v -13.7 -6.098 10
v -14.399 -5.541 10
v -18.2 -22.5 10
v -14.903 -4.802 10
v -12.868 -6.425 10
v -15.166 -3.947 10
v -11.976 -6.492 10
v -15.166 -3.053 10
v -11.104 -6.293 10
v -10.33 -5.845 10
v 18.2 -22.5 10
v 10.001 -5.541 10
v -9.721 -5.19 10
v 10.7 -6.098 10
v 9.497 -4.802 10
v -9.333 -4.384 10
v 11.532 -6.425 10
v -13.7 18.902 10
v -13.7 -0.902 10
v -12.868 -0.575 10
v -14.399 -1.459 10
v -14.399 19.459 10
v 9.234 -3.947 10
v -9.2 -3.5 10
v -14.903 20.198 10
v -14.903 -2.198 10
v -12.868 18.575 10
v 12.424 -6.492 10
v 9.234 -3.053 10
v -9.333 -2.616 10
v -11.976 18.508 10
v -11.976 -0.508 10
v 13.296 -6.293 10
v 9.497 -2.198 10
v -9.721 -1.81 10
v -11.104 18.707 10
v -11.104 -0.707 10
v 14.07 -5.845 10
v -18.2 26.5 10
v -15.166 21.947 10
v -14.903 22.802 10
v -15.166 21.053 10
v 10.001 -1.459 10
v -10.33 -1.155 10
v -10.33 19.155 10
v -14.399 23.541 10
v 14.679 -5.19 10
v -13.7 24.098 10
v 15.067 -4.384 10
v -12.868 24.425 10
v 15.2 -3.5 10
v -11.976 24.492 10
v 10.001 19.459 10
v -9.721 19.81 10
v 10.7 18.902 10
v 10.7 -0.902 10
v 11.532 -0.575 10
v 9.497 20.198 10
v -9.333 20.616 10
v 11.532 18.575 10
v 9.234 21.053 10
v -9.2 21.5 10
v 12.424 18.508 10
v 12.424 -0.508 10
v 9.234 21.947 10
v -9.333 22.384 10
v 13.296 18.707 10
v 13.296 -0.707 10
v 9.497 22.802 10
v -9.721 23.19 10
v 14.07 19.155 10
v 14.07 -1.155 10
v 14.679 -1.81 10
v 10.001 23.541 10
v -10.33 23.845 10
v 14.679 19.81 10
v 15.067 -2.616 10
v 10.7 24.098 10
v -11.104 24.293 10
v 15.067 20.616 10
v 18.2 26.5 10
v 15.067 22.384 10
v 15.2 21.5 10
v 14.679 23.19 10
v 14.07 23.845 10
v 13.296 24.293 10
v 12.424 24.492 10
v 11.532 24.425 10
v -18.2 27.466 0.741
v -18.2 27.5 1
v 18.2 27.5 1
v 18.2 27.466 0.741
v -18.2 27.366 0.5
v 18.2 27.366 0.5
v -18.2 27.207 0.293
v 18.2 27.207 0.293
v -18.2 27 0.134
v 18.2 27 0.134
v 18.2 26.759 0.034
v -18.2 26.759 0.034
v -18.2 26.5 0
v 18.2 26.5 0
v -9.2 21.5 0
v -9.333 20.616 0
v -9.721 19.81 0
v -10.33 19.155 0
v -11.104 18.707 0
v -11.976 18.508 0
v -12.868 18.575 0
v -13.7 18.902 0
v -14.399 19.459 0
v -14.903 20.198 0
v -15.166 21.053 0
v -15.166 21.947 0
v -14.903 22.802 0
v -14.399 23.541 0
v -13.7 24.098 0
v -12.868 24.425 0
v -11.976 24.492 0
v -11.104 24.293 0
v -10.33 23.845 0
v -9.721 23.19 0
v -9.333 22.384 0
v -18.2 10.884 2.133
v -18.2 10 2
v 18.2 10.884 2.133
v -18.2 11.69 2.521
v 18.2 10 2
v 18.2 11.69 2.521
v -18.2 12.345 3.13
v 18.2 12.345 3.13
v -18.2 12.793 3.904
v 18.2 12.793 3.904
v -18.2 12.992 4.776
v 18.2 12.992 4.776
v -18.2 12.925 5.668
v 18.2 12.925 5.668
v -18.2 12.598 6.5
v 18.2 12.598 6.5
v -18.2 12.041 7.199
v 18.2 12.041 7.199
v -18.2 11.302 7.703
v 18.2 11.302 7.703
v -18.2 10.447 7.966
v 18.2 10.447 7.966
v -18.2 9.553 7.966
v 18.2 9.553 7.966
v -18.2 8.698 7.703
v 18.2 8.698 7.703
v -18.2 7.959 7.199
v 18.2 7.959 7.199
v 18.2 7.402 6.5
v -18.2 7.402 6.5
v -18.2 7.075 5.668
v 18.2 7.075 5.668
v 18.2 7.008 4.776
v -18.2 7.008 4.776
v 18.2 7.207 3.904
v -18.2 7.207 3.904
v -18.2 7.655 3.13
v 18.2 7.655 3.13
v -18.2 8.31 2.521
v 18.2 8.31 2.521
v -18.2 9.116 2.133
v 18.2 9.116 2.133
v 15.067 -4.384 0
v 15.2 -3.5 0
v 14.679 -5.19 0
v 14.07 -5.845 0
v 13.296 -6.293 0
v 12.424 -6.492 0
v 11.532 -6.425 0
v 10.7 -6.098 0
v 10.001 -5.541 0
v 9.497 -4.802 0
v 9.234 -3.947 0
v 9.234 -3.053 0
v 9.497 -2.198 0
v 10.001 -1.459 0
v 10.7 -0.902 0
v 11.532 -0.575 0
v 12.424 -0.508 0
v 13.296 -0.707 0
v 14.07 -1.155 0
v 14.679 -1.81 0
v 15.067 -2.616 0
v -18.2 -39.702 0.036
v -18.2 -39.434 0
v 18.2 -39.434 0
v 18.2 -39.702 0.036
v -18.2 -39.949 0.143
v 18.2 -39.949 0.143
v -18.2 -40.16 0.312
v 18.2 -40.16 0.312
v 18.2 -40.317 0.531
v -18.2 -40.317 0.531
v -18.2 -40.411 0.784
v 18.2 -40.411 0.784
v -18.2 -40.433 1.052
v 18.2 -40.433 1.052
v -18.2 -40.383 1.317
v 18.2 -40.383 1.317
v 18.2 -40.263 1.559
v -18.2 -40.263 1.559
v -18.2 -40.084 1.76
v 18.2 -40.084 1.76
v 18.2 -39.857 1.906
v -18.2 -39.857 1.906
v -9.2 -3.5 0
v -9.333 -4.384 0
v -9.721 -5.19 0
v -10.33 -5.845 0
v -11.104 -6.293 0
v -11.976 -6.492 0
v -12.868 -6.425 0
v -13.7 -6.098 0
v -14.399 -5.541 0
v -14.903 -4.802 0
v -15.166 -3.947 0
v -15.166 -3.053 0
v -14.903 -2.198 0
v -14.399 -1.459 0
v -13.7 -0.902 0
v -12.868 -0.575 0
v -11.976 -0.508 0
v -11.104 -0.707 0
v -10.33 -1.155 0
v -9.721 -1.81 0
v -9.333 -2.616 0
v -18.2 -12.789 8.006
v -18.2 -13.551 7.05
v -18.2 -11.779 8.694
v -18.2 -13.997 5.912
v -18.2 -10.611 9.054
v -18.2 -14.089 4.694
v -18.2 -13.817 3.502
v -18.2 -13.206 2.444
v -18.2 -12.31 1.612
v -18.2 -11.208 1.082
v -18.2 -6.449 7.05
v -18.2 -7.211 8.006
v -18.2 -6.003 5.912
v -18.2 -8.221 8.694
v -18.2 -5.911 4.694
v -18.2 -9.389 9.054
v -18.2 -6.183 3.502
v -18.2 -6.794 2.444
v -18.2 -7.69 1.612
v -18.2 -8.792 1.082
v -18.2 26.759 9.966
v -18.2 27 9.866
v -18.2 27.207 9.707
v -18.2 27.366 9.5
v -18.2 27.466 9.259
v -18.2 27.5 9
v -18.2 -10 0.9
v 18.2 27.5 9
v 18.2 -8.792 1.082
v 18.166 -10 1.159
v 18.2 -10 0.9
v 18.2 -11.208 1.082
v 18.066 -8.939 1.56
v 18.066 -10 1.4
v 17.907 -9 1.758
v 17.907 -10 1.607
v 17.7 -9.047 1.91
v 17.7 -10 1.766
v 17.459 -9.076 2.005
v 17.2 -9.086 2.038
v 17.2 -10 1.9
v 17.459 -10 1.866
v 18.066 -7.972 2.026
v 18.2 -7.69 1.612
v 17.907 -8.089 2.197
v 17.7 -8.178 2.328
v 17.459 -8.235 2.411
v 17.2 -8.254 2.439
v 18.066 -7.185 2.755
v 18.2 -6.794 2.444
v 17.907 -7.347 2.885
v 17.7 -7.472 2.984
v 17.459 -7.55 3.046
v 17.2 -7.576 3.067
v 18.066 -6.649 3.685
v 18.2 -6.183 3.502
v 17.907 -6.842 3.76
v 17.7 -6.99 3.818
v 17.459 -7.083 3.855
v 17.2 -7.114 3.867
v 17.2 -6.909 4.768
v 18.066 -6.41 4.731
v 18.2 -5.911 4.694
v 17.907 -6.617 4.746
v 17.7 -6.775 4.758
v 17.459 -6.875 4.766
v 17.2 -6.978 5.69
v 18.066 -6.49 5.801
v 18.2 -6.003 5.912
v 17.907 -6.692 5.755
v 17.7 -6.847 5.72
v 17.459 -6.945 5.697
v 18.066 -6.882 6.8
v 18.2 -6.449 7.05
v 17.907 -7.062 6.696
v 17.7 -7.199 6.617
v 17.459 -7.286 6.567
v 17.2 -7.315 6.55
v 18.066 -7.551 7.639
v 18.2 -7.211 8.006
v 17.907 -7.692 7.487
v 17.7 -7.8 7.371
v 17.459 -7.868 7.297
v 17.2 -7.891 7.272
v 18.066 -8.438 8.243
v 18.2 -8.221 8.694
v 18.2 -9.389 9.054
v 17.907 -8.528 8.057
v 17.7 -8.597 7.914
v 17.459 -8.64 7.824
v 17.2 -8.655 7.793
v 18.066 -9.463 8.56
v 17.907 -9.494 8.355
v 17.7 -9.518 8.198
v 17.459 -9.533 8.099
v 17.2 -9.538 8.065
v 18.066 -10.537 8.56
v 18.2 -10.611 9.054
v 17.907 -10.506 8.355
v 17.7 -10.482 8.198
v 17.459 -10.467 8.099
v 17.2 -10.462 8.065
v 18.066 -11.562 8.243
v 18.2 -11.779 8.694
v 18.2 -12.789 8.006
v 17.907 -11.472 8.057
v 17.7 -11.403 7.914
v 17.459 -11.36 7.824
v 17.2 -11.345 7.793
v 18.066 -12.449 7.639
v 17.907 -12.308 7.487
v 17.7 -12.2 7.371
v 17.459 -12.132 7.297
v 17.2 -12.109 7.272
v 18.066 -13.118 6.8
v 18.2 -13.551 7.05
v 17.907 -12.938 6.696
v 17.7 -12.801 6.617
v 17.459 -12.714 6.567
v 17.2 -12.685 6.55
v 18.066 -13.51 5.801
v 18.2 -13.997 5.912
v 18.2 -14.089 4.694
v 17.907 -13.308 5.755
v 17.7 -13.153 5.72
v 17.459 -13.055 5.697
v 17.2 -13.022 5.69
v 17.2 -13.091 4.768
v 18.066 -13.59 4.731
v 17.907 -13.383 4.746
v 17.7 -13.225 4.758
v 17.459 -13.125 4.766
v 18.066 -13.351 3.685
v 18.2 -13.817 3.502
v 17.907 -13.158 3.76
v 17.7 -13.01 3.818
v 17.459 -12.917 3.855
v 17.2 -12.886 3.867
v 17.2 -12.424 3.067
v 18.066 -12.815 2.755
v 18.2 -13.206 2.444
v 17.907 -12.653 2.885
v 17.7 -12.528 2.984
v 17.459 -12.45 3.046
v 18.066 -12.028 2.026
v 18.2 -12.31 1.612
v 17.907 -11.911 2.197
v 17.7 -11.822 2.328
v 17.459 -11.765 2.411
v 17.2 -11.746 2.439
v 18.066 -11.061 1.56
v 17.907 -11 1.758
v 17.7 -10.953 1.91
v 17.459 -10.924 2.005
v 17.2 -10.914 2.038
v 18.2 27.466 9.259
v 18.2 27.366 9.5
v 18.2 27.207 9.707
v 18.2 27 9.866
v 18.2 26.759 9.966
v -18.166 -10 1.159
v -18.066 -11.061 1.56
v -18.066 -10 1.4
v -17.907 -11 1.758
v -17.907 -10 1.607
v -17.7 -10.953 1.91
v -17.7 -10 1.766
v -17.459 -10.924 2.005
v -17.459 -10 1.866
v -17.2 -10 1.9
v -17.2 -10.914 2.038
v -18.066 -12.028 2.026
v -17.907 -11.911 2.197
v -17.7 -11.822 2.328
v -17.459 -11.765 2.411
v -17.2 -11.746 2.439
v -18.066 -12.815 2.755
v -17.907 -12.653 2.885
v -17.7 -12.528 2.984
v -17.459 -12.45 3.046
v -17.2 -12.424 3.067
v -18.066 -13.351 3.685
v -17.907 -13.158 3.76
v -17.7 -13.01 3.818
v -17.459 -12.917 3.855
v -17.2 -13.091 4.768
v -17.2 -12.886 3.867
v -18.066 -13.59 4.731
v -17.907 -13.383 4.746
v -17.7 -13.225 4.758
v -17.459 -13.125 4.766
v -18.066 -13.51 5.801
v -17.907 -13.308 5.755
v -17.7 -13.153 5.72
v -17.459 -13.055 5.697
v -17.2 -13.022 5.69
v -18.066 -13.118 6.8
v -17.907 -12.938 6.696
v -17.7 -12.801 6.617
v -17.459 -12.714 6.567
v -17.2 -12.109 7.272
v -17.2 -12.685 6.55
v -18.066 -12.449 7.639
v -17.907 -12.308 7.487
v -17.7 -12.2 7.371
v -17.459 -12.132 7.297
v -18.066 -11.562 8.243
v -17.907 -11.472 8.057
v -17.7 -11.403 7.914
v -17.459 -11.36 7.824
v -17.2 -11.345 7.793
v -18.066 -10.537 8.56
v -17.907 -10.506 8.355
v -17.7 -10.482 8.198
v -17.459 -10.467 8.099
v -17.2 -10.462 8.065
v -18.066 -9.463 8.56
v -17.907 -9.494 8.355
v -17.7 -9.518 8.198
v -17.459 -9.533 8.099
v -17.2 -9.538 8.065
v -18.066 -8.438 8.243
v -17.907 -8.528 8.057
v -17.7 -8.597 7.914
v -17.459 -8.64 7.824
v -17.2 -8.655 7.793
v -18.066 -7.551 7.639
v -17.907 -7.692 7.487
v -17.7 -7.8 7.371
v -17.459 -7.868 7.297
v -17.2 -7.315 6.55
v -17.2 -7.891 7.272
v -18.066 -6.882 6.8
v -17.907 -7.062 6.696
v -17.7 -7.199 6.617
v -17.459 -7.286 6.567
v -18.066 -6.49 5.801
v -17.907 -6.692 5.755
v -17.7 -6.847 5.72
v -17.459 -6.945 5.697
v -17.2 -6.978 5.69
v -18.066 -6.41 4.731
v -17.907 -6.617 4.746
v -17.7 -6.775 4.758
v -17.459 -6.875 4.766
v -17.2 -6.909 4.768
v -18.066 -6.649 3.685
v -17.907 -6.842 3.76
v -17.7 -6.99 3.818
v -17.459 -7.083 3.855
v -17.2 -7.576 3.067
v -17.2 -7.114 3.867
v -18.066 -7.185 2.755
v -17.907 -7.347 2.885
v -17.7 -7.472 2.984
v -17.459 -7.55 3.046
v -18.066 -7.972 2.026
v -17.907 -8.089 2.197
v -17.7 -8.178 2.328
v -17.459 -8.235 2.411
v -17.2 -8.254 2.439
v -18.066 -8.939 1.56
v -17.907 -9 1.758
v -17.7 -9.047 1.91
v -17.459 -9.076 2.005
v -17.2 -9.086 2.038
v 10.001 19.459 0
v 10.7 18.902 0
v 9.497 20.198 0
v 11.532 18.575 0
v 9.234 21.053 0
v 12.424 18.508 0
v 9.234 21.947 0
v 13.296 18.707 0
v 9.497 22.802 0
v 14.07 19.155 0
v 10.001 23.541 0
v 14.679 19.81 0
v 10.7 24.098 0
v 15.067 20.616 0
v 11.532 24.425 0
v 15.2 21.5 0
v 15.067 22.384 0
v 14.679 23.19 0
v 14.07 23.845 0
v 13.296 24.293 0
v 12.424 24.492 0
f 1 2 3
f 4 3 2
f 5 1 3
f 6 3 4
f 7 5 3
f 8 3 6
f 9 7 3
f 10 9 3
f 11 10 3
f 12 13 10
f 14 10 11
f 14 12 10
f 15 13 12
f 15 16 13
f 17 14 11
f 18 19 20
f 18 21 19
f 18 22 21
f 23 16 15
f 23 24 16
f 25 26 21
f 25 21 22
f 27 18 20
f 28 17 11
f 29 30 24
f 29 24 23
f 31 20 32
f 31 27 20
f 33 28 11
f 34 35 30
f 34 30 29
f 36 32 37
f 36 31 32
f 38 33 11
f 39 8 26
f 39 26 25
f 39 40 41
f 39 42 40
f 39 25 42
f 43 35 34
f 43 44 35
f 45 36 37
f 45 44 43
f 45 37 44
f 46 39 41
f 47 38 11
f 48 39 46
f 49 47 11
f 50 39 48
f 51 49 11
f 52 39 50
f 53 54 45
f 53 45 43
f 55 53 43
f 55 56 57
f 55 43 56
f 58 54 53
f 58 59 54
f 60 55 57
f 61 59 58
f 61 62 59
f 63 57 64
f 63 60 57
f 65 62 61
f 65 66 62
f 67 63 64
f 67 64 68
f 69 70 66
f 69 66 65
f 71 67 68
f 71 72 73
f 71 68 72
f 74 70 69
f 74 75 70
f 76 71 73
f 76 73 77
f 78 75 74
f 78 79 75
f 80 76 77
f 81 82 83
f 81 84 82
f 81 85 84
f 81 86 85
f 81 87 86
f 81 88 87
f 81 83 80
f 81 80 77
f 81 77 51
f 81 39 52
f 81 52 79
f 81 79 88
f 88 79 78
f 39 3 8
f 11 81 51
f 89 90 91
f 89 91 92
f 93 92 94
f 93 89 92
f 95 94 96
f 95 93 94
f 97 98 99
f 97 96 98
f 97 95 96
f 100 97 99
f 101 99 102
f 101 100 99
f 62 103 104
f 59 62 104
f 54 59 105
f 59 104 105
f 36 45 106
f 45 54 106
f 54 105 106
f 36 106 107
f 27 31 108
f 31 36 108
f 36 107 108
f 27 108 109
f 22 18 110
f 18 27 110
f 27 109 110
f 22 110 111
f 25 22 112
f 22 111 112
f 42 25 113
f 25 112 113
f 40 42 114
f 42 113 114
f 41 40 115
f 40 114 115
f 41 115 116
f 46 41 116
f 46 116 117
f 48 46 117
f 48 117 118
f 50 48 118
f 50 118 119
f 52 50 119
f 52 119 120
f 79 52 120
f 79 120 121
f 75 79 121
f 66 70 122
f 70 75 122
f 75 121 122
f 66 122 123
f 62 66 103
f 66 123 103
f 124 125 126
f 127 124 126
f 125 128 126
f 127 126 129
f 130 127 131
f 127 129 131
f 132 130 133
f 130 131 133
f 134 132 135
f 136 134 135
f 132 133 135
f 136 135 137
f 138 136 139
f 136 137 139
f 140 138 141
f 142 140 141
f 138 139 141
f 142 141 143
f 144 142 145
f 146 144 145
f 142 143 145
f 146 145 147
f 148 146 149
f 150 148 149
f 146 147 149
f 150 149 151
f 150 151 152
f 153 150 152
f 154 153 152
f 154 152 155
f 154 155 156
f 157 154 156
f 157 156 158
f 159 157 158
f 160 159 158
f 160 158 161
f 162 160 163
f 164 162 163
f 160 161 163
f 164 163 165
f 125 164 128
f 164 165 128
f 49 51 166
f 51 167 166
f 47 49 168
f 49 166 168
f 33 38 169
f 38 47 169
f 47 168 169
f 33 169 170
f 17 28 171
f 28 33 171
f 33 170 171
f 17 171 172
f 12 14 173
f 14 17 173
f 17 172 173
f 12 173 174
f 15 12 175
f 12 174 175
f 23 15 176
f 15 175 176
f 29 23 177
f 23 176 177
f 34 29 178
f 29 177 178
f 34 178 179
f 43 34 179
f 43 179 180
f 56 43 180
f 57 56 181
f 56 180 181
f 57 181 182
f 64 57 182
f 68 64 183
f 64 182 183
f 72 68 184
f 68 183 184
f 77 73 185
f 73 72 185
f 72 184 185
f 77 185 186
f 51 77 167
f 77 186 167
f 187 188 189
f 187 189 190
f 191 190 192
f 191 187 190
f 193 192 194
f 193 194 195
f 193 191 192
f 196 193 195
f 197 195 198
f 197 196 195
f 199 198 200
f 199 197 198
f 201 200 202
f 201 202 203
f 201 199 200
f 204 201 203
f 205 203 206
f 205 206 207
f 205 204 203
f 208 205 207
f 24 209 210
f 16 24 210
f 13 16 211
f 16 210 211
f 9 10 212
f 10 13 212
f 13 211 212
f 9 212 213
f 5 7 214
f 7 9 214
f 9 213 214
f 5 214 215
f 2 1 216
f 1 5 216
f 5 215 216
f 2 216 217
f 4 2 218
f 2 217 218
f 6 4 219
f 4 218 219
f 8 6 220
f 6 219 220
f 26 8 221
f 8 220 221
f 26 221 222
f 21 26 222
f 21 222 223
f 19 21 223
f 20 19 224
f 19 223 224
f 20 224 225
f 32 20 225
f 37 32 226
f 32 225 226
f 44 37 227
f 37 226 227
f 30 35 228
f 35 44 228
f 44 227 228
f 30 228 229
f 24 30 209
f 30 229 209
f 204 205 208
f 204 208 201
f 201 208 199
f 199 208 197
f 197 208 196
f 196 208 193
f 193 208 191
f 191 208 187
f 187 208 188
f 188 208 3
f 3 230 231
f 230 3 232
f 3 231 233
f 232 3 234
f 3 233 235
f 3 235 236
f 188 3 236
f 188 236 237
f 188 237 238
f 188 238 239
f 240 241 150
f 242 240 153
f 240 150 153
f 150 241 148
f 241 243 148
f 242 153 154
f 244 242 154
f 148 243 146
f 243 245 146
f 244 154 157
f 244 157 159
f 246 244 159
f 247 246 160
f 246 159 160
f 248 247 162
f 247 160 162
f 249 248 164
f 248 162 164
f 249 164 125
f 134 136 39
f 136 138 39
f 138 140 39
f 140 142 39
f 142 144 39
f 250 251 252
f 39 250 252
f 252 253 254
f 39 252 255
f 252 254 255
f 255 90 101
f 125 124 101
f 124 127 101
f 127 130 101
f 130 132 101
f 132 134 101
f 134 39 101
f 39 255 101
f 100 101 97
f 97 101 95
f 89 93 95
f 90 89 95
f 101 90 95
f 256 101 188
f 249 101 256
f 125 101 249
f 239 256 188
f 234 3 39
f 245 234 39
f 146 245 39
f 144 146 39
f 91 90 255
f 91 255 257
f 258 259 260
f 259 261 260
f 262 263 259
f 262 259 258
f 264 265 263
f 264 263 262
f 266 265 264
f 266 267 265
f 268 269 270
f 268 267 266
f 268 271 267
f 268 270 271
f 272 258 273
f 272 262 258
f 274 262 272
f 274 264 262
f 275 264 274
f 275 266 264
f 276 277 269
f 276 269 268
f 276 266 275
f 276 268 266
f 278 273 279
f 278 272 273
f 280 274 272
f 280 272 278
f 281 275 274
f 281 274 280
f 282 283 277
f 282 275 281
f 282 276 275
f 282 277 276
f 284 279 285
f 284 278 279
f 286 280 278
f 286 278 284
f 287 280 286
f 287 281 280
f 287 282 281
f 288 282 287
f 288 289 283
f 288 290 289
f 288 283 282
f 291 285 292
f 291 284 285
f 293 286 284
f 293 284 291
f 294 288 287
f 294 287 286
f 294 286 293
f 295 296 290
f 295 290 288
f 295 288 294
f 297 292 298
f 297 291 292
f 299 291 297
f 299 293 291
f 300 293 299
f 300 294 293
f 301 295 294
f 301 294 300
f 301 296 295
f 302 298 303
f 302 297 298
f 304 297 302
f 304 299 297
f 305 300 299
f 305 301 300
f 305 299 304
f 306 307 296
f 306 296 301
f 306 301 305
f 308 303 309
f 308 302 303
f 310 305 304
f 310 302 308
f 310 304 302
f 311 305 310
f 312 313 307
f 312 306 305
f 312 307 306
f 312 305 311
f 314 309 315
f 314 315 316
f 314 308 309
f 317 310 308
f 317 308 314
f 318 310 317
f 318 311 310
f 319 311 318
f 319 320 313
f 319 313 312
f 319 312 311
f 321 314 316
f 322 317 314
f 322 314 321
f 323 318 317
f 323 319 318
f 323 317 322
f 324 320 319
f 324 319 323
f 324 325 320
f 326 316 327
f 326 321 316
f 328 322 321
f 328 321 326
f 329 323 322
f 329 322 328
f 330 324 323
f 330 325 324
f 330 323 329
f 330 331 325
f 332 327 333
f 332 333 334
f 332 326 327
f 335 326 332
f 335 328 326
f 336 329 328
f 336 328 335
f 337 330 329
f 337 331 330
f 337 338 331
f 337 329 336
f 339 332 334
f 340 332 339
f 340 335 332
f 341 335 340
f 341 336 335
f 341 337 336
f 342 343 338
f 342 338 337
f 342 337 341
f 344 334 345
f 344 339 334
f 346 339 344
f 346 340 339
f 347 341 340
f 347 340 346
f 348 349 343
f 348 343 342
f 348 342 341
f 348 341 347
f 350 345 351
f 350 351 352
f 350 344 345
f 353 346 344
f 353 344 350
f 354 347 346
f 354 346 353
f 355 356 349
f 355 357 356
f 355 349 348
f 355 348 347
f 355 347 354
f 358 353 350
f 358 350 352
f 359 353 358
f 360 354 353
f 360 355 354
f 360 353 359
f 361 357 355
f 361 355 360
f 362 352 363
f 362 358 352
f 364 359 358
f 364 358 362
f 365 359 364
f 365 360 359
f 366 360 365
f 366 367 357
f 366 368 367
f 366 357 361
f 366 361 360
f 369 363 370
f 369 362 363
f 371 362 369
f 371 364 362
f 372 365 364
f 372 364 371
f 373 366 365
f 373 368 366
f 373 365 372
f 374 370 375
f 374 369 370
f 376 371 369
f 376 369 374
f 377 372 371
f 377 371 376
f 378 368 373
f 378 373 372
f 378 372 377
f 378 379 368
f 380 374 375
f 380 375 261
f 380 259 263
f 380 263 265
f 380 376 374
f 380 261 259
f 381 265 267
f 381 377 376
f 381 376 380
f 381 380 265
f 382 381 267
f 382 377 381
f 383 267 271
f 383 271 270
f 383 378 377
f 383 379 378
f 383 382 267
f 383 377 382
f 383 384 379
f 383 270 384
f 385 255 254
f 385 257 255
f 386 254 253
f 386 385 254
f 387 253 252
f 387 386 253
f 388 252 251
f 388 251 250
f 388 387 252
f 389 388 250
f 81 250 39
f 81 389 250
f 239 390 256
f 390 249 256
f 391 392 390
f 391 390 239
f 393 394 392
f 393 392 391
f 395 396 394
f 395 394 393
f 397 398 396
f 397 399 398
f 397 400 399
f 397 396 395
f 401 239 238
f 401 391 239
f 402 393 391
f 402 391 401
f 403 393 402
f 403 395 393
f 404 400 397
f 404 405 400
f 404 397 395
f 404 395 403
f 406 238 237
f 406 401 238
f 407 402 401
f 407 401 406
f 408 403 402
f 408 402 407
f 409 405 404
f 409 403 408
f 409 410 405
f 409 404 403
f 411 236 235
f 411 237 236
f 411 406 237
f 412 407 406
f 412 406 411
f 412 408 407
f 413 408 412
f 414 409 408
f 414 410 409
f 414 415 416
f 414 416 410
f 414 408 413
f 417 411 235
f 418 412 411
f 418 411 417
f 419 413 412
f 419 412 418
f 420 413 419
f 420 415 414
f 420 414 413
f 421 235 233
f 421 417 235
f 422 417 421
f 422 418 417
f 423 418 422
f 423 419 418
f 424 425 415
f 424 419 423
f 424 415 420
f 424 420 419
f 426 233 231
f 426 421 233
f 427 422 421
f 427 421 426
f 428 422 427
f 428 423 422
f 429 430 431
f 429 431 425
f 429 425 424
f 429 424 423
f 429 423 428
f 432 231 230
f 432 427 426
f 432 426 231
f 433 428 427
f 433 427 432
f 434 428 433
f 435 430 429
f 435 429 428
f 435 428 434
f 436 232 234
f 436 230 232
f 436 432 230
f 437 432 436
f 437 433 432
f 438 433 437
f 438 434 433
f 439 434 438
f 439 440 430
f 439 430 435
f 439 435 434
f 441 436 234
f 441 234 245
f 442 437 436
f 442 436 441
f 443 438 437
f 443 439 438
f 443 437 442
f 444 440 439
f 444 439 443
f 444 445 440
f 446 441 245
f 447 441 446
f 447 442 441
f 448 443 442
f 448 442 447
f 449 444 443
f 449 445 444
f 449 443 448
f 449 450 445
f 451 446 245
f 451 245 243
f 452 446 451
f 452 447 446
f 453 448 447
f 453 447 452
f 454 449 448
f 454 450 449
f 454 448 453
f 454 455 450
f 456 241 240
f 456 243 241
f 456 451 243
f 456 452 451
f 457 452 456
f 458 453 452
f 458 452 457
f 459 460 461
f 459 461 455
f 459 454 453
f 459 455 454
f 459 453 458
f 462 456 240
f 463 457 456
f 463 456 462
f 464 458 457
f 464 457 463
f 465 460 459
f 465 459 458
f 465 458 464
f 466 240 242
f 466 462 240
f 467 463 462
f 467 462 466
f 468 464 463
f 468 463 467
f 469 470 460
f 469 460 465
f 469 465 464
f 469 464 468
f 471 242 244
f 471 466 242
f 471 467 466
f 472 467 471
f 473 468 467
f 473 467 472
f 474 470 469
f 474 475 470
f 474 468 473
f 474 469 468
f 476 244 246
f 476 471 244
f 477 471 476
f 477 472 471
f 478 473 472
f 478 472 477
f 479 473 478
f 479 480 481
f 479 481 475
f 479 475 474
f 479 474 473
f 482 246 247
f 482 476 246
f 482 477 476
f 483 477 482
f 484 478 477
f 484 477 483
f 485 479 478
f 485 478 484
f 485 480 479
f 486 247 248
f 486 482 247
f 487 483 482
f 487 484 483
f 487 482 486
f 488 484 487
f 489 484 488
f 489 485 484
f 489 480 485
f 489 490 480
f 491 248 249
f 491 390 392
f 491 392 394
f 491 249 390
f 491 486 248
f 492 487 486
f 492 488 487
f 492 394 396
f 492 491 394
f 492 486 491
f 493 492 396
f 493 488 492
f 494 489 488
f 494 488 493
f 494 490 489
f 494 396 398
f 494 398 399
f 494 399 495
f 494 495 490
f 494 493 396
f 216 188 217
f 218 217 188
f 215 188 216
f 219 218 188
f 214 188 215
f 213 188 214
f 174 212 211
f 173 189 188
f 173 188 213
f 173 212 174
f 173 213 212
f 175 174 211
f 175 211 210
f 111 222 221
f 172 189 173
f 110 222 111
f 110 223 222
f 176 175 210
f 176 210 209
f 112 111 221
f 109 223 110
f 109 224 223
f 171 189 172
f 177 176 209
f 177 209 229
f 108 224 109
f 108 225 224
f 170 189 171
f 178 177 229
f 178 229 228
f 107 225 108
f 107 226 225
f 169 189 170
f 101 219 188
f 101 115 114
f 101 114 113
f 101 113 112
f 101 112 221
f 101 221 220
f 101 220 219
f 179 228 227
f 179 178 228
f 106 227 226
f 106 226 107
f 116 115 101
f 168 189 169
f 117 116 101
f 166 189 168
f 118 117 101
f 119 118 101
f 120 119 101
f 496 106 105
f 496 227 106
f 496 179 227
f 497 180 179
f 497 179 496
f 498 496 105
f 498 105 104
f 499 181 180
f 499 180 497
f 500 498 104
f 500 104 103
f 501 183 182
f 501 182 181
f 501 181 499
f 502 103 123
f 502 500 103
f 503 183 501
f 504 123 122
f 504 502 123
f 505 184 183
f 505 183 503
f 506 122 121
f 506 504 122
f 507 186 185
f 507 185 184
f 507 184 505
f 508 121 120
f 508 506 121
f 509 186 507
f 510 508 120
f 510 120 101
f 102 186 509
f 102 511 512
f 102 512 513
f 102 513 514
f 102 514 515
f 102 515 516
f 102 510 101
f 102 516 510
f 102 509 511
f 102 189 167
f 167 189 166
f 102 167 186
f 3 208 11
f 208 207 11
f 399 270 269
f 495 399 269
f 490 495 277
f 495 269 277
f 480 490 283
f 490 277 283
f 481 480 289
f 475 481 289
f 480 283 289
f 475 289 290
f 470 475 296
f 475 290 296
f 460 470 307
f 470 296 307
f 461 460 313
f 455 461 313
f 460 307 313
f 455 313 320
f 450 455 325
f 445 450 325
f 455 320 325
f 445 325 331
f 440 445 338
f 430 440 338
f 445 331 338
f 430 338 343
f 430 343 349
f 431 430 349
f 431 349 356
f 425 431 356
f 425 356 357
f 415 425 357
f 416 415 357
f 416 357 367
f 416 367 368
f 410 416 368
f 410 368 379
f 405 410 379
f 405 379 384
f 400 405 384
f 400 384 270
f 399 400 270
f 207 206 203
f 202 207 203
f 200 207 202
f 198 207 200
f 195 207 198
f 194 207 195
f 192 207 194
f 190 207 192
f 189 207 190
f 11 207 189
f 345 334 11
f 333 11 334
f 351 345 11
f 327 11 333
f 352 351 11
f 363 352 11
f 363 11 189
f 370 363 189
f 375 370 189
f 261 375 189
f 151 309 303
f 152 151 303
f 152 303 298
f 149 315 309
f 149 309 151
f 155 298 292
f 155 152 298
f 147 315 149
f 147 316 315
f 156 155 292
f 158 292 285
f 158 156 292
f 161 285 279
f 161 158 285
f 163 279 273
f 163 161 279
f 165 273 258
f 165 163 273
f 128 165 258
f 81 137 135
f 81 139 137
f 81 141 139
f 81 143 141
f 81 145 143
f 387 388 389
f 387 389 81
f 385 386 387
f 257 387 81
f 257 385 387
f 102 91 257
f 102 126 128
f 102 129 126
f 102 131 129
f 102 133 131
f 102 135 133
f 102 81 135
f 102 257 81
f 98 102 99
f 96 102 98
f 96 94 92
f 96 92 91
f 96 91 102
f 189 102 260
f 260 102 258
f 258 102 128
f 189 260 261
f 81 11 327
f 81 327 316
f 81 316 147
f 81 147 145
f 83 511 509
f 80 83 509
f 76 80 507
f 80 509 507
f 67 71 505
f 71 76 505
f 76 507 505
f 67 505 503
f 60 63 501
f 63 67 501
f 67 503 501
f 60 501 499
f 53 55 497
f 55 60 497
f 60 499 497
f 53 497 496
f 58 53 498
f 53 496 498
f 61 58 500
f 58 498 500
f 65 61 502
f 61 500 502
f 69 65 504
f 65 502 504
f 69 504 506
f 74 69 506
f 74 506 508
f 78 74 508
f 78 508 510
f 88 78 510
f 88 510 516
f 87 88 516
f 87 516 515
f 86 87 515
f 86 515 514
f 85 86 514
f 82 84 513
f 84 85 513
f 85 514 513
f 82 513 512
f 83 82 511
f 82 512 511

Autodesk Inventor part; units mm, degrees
ref_plane "YZ Plane" through (0, 0, 0) normal (1, 0, 0) x (0, 1, 0)
ref_plane "XZ Plane" through (0, 0, 0) normal (0, 1, 0) x (-1, 0, 0)
ref_plane "XY Plane" through (0, 0, 0) normal (0, 0, 1) x (1, 0, 0)
sketch "Sketch1" plane through (0, 0, 0) normal (0, 0, 1) x (1, 0, 0)
  line L0 (-18.2, 27.5) -> (18.2, 27.5)
  line L1 (18.2, 27.5) -> (18.2, -27.5)
  line L2 (18.2, -27.5) -> (-18.2, -27.5)
  line L3 (-18.2, -27.5) -> (-18.2, 27.5)
  line L4 (0, -38.5) -> (0, 38.5) projected
  line L5 (-25.48, 0) -> (25.48, 0) projected
  circle A0 centre (-12.2, 21.5) radius 3
  circle A1 centre (-12.2, 21.5) radius 6 construction
  circle A2 centre (-12.2, -3.5) radius 3
  line L6 (-12.2, 27.5) -> (-12.2, -3.5) construction
  circle A3 centre (12.2, 21.5) radius 3
  circle A4 centre (12.2, -3.5) radius 3
  point P0 (0, 0)
  point P1 (0, 27.5)
  point P2 (-18.2, 0)
  dimension "d0" = 36.4
  dimension "d1" = 55
  dimension "d2" = 6
  dimension "d3" = 3
  dimension "d34" = 25
extrude "Extrusion1" add sketch "Sketch1" along normal blind 10
sketch "Sketch4" plane through (18.2, -27.5, 0) normal (1, 0, 0) x (0, 0, -1)
  circle A0 centre (-5, 17.5) radius 3 construction
  line L0 (-10, 55) -> (-10, 0) projected
  line L1 (-10, 27.5) -> (0, 27.5) construction
  line L2 (0, 55) -> (0, 0) projected
  circle A1 centre (-5, 37.5) radius 3
  line L3 (0, 0) -> (-10, 0) projected
  line L4 (-5, 0) -> (-5, 55) construction
  line L5 (0, 55) -> (-10, 55) projected
  circle A2 centre (-5, 17.5) radius 3.1
  dimension "d20" = 6
  dimension "d21" = 20
  dimension "d24" = 6.2
extrude "Extrusion4" cut sketch "Sketch4" against normal up to surface (36.4 mm away) contours A1 | A2
thread "Thread1" size "M6x1" class "6H" standard "ANSI Metric M Profile" full length
sketch "Sketch5" plane through (18.2, -27.5, 0) normal (1, 0, 0) x (0, 0, -1)
  line L0 (-10, 55) -> (-10, 0) projected
  line L1 (0, -16.4451) -> (0, 0)
  line L2 (0, 0) -> (0, 55) projected
  line L3 (0, 0) -> (-10, 0) projected
  line L4 (0, -16.4451) -> (-10, 5)
  point P0 (0, 27.5)
  point P1 (-7.6685, 0)
  dimension "d30" = 5
  dimension "d31" = 25
extrude "Extrusion5" add sketch "Sketch5" against normal up to surface (36.4 mm away) contours L3 L1 L4
extrude "Extrusion6" cut sketch "Sketch5" against normal up to surface (36.4 mm away) contours L4 L3 L0
fillet "Fillet1" radius 1 5 edges at (0, 27.5, 0) (0, 27.5, 10) (0, -43.9451, 0) (18.2, -10, 8.1) (-18.2, -10, 8.1)
thread "Thread2" size "M6x1" class "6H" standard "ANSI Metric M Profile" full length
thread "Thread3" size "M6x1" class "6H" standard "ANSI Metric M Profile" full length
thread "Thread4" size "M6x1" class "6H" standard "ANSI Metric M Profile" full length
thread "Thread5" size "M6x1" class "6H" standard "ANSI Metric M Profile" full length
properties part number "Pedal Support 1"
